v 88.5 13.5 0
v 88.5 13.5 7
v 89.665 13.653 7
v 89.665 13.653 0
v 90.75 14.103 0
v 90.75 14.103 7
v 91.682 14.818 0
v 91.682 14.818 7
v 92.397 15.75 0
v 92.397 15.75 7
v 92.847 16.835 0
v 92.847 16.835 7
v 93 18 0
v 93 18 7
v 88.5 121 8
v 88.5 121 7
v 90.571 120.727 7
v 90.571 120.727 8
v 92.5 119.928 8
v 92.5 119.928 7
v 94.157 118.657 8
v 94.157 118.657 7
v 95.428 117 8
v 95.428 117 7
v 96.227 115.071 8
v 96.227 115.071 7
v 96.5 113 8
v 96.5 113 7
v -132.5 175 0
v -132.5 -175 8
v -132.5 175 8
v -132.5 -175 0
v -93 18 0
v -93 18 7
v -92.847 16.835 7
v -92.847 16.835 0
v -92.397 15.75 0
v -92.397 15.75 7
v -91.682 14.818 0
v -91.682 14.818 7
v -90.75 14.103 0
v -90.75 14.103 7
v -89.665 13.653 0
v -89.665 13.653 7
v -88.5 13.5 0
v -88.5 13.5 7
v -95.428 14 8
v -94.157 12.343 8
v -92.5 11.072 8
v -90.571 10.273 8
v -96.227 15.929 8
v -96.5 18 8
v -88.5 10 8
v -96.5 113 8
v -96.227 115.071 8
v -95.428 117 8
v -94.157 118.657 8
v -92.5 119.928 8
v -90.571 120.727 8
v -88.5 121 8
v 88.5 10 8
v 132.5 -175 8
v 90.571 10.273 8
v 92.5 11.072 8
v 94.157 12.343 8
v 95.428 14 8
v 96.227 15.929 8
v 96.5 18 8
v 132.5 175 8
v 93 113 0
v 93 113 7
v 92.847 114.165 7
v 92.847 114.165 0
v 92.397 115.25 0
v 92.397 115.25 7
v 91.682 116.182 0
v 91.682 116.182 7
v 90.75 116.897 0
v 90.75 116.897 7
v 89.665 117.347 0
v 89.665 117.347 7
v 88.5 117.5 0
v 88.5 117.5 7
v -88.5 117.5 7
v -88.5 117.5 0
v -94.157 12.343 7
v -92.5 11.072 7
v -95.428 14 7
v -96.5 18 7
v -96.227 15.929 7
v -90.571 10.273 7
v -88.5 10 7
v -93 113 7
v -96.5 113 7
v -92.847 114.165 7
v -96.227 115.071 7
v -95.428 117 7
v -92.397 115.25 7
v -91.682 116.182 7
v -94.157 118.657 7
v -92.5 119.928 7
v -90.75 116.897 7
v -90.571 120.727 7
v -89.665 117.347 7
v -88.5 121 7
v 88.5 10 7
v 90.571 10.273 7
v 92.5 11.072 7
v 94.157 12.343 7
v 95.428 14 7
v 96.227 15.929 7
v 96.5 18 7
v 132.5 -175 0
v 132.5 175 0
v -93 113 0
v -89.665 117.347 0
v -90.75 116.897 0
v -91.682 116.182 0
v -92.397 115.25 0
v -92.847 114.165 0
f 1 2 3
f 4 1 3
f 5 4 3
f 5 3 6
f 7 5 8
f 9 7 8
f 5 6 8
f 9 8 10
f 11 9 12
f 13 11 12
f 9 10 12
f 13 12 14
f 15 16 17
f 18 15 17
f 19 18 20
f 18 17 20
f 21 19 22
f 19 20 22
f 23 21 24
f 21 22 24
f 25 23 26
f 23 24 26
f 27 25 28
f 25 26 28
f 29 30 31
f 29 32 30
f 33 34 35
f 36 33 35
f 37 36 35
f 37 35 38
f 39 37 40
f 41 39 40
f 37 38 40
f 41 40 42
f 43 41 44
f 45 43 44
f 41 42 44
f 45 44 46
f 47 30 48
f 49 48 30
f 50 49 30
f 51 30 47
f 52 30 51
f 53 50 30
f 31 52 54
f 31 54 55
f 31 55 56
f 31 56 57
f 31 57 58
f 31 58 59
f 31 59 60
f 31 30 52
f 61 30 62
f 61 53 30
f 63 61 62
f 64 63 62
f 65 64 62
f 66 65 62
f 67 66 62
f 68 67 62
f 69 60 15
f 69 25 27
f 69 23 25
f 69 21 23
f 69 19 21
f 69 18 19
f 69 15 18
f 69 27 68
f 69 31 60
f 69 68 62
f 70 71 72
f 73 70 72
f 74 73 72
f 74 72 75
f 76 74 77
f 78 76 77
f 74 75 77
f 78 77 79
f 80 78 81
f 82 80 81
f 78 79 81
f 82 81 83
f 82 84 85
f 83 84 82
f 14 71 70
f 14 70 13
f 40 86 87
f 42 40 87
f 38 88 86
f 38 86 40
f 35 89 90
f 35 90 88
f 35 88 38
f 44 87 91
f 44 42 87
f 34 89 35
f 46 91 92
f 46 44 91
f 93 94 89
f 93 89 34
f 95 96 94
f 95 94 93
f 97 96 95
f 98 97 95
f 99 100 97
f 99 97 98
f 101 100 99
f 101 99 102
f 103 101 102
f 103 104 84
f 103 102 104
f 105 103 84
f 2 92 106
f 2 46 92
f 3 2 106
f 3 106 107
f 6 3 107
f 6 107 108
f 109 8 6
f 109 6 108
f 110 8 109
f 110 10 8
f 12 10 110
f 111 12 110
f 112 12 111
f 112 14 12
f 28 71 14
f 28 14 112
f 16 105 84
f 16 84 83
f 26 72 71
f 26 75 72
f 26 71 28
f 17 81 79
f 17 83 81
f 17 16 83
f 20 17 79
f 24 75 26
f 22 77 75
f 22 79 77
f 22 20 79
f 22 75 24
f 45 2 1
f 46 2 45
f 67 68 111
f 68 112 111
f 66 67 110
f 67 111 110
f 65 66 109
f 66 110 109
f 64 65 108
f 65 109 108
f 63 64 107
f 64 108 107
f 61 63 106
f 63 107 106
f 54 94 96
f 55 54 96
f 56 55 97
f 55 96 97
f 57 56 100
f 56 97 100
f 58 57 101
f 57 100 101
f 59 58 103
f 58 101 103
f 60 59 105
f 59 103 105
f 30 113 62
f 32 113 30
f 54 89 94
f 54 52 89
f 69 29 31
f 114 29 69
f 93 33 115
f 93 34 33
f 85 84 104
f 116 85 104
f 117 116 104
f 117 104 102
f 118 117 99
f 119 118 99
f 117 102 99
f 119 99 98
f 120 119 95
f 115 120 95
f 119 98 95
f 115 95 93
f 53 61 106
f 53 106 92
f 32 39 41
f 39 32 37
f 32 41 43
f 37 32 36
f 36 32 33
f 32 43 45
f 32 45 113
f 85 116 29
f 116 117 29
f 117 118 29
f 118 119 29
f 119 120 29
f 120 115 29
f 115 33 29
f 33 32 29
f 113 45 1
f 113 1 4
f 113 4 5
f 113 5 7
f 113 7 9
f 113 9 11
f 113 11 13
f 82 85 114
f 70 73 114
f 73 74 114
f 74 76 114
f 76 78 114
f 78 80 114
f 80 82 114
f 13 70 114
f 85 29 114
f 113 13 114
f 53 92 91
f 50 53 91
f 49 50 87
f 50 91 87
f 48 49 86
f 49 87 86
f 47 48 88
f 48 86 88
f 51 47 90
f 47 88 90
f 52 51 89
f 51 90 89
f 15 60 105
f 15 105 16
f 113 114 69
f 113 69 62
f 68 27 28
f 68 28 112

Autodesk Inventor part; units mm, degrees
ref_plane "YZ Plane" through (0, 0, 0) normal (1, 0, 0) x (0, 1, 0)
ref_plane "XZ Plane" through (0, 0, 0) normal (0, 1, 0) x (-1, 0, 0)
ref_plane "XY Plane" through (0, 0, 0) normal (0, 0, 1) x (1, 0, 0)
sketch "Sketch1" plane through (0, 0, 0) normal (0, 0, 1) x (1, 0, 0)
  line L0 (-132.5, 175) -> (132.5, 175)
  line L1 (132.5, 175) -> (132.5, -175)
  line L2 (132.5, -175) -> (-132.5, -175)
  line L3 (-132.5, -175) -> (-132.5, 175)
  point P0 (0, 0)
  dimension "d0" = 265
  dimension "d1" = 350
  dimension "d2" = 265
  dimension "d3" = 350
  dimension "d4" = 132.5
  dimension "d5" = 175
extrude "Extrusion1" add sketch "Sketch1" along normal blind 8
sketch "Sketch2" plane through (0, 0, 8) normal (0, 0, 1) x (1, 0, 0)
  line L0 (-96.5, 121) -> (96.5, 121)
  line L1 (96.5, 121) -> (96.5, 10)
  line L2 (96.5, 10) -> (-96.5, 10)
  line L3 (-96.5, 10) -> (-96.5, 121)
  point P0 (0, 0)
  dimension "d8" = 193
  dimension "d9" = 111
  dimension "d10" = 96.5
  dimension "d17" = 10
extrude "Extrusion2" cut sketch "Sketch2" against normal blind 1
fillet "Fillet1" radius 8 4 edges at (-96.5, 121, 7.5) (96.5, 121, 7.5) (96.5, 10, 7.5) (-96.5, 10, 7.5)
sketch "Sketch3" plane through (0, 0, 7) normal (0, 0, 1) x (1, 0, 0)
  arc A0 (-96.5, 18) -> (-88.5, 10) centre (-88.5, 18) ccw projected
  line L0 (88.5, 10) -> (-88.5, 10) projected
  arc A1 (88.5, 10) -> (96.5, 18) centre (88.5, 18) ccw projected
  line L1 (96.5, 113) -> (96.5, 18) projected
  arc A2 (96.5, 113) -> (88.5, 121) centre (88.5, 113) ccw projected
  line L2 (-88.5, 121) -> (88.5, 121) projected
  arc A3 (-88.5, 121) -> (-96.5, 113) centre (-88.5, 113) ccw projected
  line L3 (-96.5, 18) -> (-96.5, 113) projected
  arc A4 (-88.5, 117.5) -> (-93, 113) centre (-88.5, 113) ccw
  line L4 (-88.5, 117.5) -> (88.5, 117.5)
  arc A5 (93, 113) -> (88.5, 117.5) centre (88.5, 113) ccw
  line L5 (93, 113) -> (93, 18)
  arc A6 (88.5, 13.5) -> (93, 18) centre (88.5, 18) ccw
  line L6 (88.5, 13.5) -> (-88.5, 13.5)
  arc A7 (-93, 18) -> (-88.5, 13.5) centre (-88.5, 18) ccw
  line L7 (-93, 18) -> (-93, 113)
  point P0 (0, 0)
  dimension "d14" = 3.5
extrude "Extrusion3" cut sketch "Sketch3" against normal through all contours L4 A5 L5 A6 L6 A7 L7 A4
equation "\"d4\" = 0.5 * d2"
equation "\"d5\" = 0.5 * d3"
equation "\"d10\" = 0.5 * d8"
properties part number "masca raspberry"
